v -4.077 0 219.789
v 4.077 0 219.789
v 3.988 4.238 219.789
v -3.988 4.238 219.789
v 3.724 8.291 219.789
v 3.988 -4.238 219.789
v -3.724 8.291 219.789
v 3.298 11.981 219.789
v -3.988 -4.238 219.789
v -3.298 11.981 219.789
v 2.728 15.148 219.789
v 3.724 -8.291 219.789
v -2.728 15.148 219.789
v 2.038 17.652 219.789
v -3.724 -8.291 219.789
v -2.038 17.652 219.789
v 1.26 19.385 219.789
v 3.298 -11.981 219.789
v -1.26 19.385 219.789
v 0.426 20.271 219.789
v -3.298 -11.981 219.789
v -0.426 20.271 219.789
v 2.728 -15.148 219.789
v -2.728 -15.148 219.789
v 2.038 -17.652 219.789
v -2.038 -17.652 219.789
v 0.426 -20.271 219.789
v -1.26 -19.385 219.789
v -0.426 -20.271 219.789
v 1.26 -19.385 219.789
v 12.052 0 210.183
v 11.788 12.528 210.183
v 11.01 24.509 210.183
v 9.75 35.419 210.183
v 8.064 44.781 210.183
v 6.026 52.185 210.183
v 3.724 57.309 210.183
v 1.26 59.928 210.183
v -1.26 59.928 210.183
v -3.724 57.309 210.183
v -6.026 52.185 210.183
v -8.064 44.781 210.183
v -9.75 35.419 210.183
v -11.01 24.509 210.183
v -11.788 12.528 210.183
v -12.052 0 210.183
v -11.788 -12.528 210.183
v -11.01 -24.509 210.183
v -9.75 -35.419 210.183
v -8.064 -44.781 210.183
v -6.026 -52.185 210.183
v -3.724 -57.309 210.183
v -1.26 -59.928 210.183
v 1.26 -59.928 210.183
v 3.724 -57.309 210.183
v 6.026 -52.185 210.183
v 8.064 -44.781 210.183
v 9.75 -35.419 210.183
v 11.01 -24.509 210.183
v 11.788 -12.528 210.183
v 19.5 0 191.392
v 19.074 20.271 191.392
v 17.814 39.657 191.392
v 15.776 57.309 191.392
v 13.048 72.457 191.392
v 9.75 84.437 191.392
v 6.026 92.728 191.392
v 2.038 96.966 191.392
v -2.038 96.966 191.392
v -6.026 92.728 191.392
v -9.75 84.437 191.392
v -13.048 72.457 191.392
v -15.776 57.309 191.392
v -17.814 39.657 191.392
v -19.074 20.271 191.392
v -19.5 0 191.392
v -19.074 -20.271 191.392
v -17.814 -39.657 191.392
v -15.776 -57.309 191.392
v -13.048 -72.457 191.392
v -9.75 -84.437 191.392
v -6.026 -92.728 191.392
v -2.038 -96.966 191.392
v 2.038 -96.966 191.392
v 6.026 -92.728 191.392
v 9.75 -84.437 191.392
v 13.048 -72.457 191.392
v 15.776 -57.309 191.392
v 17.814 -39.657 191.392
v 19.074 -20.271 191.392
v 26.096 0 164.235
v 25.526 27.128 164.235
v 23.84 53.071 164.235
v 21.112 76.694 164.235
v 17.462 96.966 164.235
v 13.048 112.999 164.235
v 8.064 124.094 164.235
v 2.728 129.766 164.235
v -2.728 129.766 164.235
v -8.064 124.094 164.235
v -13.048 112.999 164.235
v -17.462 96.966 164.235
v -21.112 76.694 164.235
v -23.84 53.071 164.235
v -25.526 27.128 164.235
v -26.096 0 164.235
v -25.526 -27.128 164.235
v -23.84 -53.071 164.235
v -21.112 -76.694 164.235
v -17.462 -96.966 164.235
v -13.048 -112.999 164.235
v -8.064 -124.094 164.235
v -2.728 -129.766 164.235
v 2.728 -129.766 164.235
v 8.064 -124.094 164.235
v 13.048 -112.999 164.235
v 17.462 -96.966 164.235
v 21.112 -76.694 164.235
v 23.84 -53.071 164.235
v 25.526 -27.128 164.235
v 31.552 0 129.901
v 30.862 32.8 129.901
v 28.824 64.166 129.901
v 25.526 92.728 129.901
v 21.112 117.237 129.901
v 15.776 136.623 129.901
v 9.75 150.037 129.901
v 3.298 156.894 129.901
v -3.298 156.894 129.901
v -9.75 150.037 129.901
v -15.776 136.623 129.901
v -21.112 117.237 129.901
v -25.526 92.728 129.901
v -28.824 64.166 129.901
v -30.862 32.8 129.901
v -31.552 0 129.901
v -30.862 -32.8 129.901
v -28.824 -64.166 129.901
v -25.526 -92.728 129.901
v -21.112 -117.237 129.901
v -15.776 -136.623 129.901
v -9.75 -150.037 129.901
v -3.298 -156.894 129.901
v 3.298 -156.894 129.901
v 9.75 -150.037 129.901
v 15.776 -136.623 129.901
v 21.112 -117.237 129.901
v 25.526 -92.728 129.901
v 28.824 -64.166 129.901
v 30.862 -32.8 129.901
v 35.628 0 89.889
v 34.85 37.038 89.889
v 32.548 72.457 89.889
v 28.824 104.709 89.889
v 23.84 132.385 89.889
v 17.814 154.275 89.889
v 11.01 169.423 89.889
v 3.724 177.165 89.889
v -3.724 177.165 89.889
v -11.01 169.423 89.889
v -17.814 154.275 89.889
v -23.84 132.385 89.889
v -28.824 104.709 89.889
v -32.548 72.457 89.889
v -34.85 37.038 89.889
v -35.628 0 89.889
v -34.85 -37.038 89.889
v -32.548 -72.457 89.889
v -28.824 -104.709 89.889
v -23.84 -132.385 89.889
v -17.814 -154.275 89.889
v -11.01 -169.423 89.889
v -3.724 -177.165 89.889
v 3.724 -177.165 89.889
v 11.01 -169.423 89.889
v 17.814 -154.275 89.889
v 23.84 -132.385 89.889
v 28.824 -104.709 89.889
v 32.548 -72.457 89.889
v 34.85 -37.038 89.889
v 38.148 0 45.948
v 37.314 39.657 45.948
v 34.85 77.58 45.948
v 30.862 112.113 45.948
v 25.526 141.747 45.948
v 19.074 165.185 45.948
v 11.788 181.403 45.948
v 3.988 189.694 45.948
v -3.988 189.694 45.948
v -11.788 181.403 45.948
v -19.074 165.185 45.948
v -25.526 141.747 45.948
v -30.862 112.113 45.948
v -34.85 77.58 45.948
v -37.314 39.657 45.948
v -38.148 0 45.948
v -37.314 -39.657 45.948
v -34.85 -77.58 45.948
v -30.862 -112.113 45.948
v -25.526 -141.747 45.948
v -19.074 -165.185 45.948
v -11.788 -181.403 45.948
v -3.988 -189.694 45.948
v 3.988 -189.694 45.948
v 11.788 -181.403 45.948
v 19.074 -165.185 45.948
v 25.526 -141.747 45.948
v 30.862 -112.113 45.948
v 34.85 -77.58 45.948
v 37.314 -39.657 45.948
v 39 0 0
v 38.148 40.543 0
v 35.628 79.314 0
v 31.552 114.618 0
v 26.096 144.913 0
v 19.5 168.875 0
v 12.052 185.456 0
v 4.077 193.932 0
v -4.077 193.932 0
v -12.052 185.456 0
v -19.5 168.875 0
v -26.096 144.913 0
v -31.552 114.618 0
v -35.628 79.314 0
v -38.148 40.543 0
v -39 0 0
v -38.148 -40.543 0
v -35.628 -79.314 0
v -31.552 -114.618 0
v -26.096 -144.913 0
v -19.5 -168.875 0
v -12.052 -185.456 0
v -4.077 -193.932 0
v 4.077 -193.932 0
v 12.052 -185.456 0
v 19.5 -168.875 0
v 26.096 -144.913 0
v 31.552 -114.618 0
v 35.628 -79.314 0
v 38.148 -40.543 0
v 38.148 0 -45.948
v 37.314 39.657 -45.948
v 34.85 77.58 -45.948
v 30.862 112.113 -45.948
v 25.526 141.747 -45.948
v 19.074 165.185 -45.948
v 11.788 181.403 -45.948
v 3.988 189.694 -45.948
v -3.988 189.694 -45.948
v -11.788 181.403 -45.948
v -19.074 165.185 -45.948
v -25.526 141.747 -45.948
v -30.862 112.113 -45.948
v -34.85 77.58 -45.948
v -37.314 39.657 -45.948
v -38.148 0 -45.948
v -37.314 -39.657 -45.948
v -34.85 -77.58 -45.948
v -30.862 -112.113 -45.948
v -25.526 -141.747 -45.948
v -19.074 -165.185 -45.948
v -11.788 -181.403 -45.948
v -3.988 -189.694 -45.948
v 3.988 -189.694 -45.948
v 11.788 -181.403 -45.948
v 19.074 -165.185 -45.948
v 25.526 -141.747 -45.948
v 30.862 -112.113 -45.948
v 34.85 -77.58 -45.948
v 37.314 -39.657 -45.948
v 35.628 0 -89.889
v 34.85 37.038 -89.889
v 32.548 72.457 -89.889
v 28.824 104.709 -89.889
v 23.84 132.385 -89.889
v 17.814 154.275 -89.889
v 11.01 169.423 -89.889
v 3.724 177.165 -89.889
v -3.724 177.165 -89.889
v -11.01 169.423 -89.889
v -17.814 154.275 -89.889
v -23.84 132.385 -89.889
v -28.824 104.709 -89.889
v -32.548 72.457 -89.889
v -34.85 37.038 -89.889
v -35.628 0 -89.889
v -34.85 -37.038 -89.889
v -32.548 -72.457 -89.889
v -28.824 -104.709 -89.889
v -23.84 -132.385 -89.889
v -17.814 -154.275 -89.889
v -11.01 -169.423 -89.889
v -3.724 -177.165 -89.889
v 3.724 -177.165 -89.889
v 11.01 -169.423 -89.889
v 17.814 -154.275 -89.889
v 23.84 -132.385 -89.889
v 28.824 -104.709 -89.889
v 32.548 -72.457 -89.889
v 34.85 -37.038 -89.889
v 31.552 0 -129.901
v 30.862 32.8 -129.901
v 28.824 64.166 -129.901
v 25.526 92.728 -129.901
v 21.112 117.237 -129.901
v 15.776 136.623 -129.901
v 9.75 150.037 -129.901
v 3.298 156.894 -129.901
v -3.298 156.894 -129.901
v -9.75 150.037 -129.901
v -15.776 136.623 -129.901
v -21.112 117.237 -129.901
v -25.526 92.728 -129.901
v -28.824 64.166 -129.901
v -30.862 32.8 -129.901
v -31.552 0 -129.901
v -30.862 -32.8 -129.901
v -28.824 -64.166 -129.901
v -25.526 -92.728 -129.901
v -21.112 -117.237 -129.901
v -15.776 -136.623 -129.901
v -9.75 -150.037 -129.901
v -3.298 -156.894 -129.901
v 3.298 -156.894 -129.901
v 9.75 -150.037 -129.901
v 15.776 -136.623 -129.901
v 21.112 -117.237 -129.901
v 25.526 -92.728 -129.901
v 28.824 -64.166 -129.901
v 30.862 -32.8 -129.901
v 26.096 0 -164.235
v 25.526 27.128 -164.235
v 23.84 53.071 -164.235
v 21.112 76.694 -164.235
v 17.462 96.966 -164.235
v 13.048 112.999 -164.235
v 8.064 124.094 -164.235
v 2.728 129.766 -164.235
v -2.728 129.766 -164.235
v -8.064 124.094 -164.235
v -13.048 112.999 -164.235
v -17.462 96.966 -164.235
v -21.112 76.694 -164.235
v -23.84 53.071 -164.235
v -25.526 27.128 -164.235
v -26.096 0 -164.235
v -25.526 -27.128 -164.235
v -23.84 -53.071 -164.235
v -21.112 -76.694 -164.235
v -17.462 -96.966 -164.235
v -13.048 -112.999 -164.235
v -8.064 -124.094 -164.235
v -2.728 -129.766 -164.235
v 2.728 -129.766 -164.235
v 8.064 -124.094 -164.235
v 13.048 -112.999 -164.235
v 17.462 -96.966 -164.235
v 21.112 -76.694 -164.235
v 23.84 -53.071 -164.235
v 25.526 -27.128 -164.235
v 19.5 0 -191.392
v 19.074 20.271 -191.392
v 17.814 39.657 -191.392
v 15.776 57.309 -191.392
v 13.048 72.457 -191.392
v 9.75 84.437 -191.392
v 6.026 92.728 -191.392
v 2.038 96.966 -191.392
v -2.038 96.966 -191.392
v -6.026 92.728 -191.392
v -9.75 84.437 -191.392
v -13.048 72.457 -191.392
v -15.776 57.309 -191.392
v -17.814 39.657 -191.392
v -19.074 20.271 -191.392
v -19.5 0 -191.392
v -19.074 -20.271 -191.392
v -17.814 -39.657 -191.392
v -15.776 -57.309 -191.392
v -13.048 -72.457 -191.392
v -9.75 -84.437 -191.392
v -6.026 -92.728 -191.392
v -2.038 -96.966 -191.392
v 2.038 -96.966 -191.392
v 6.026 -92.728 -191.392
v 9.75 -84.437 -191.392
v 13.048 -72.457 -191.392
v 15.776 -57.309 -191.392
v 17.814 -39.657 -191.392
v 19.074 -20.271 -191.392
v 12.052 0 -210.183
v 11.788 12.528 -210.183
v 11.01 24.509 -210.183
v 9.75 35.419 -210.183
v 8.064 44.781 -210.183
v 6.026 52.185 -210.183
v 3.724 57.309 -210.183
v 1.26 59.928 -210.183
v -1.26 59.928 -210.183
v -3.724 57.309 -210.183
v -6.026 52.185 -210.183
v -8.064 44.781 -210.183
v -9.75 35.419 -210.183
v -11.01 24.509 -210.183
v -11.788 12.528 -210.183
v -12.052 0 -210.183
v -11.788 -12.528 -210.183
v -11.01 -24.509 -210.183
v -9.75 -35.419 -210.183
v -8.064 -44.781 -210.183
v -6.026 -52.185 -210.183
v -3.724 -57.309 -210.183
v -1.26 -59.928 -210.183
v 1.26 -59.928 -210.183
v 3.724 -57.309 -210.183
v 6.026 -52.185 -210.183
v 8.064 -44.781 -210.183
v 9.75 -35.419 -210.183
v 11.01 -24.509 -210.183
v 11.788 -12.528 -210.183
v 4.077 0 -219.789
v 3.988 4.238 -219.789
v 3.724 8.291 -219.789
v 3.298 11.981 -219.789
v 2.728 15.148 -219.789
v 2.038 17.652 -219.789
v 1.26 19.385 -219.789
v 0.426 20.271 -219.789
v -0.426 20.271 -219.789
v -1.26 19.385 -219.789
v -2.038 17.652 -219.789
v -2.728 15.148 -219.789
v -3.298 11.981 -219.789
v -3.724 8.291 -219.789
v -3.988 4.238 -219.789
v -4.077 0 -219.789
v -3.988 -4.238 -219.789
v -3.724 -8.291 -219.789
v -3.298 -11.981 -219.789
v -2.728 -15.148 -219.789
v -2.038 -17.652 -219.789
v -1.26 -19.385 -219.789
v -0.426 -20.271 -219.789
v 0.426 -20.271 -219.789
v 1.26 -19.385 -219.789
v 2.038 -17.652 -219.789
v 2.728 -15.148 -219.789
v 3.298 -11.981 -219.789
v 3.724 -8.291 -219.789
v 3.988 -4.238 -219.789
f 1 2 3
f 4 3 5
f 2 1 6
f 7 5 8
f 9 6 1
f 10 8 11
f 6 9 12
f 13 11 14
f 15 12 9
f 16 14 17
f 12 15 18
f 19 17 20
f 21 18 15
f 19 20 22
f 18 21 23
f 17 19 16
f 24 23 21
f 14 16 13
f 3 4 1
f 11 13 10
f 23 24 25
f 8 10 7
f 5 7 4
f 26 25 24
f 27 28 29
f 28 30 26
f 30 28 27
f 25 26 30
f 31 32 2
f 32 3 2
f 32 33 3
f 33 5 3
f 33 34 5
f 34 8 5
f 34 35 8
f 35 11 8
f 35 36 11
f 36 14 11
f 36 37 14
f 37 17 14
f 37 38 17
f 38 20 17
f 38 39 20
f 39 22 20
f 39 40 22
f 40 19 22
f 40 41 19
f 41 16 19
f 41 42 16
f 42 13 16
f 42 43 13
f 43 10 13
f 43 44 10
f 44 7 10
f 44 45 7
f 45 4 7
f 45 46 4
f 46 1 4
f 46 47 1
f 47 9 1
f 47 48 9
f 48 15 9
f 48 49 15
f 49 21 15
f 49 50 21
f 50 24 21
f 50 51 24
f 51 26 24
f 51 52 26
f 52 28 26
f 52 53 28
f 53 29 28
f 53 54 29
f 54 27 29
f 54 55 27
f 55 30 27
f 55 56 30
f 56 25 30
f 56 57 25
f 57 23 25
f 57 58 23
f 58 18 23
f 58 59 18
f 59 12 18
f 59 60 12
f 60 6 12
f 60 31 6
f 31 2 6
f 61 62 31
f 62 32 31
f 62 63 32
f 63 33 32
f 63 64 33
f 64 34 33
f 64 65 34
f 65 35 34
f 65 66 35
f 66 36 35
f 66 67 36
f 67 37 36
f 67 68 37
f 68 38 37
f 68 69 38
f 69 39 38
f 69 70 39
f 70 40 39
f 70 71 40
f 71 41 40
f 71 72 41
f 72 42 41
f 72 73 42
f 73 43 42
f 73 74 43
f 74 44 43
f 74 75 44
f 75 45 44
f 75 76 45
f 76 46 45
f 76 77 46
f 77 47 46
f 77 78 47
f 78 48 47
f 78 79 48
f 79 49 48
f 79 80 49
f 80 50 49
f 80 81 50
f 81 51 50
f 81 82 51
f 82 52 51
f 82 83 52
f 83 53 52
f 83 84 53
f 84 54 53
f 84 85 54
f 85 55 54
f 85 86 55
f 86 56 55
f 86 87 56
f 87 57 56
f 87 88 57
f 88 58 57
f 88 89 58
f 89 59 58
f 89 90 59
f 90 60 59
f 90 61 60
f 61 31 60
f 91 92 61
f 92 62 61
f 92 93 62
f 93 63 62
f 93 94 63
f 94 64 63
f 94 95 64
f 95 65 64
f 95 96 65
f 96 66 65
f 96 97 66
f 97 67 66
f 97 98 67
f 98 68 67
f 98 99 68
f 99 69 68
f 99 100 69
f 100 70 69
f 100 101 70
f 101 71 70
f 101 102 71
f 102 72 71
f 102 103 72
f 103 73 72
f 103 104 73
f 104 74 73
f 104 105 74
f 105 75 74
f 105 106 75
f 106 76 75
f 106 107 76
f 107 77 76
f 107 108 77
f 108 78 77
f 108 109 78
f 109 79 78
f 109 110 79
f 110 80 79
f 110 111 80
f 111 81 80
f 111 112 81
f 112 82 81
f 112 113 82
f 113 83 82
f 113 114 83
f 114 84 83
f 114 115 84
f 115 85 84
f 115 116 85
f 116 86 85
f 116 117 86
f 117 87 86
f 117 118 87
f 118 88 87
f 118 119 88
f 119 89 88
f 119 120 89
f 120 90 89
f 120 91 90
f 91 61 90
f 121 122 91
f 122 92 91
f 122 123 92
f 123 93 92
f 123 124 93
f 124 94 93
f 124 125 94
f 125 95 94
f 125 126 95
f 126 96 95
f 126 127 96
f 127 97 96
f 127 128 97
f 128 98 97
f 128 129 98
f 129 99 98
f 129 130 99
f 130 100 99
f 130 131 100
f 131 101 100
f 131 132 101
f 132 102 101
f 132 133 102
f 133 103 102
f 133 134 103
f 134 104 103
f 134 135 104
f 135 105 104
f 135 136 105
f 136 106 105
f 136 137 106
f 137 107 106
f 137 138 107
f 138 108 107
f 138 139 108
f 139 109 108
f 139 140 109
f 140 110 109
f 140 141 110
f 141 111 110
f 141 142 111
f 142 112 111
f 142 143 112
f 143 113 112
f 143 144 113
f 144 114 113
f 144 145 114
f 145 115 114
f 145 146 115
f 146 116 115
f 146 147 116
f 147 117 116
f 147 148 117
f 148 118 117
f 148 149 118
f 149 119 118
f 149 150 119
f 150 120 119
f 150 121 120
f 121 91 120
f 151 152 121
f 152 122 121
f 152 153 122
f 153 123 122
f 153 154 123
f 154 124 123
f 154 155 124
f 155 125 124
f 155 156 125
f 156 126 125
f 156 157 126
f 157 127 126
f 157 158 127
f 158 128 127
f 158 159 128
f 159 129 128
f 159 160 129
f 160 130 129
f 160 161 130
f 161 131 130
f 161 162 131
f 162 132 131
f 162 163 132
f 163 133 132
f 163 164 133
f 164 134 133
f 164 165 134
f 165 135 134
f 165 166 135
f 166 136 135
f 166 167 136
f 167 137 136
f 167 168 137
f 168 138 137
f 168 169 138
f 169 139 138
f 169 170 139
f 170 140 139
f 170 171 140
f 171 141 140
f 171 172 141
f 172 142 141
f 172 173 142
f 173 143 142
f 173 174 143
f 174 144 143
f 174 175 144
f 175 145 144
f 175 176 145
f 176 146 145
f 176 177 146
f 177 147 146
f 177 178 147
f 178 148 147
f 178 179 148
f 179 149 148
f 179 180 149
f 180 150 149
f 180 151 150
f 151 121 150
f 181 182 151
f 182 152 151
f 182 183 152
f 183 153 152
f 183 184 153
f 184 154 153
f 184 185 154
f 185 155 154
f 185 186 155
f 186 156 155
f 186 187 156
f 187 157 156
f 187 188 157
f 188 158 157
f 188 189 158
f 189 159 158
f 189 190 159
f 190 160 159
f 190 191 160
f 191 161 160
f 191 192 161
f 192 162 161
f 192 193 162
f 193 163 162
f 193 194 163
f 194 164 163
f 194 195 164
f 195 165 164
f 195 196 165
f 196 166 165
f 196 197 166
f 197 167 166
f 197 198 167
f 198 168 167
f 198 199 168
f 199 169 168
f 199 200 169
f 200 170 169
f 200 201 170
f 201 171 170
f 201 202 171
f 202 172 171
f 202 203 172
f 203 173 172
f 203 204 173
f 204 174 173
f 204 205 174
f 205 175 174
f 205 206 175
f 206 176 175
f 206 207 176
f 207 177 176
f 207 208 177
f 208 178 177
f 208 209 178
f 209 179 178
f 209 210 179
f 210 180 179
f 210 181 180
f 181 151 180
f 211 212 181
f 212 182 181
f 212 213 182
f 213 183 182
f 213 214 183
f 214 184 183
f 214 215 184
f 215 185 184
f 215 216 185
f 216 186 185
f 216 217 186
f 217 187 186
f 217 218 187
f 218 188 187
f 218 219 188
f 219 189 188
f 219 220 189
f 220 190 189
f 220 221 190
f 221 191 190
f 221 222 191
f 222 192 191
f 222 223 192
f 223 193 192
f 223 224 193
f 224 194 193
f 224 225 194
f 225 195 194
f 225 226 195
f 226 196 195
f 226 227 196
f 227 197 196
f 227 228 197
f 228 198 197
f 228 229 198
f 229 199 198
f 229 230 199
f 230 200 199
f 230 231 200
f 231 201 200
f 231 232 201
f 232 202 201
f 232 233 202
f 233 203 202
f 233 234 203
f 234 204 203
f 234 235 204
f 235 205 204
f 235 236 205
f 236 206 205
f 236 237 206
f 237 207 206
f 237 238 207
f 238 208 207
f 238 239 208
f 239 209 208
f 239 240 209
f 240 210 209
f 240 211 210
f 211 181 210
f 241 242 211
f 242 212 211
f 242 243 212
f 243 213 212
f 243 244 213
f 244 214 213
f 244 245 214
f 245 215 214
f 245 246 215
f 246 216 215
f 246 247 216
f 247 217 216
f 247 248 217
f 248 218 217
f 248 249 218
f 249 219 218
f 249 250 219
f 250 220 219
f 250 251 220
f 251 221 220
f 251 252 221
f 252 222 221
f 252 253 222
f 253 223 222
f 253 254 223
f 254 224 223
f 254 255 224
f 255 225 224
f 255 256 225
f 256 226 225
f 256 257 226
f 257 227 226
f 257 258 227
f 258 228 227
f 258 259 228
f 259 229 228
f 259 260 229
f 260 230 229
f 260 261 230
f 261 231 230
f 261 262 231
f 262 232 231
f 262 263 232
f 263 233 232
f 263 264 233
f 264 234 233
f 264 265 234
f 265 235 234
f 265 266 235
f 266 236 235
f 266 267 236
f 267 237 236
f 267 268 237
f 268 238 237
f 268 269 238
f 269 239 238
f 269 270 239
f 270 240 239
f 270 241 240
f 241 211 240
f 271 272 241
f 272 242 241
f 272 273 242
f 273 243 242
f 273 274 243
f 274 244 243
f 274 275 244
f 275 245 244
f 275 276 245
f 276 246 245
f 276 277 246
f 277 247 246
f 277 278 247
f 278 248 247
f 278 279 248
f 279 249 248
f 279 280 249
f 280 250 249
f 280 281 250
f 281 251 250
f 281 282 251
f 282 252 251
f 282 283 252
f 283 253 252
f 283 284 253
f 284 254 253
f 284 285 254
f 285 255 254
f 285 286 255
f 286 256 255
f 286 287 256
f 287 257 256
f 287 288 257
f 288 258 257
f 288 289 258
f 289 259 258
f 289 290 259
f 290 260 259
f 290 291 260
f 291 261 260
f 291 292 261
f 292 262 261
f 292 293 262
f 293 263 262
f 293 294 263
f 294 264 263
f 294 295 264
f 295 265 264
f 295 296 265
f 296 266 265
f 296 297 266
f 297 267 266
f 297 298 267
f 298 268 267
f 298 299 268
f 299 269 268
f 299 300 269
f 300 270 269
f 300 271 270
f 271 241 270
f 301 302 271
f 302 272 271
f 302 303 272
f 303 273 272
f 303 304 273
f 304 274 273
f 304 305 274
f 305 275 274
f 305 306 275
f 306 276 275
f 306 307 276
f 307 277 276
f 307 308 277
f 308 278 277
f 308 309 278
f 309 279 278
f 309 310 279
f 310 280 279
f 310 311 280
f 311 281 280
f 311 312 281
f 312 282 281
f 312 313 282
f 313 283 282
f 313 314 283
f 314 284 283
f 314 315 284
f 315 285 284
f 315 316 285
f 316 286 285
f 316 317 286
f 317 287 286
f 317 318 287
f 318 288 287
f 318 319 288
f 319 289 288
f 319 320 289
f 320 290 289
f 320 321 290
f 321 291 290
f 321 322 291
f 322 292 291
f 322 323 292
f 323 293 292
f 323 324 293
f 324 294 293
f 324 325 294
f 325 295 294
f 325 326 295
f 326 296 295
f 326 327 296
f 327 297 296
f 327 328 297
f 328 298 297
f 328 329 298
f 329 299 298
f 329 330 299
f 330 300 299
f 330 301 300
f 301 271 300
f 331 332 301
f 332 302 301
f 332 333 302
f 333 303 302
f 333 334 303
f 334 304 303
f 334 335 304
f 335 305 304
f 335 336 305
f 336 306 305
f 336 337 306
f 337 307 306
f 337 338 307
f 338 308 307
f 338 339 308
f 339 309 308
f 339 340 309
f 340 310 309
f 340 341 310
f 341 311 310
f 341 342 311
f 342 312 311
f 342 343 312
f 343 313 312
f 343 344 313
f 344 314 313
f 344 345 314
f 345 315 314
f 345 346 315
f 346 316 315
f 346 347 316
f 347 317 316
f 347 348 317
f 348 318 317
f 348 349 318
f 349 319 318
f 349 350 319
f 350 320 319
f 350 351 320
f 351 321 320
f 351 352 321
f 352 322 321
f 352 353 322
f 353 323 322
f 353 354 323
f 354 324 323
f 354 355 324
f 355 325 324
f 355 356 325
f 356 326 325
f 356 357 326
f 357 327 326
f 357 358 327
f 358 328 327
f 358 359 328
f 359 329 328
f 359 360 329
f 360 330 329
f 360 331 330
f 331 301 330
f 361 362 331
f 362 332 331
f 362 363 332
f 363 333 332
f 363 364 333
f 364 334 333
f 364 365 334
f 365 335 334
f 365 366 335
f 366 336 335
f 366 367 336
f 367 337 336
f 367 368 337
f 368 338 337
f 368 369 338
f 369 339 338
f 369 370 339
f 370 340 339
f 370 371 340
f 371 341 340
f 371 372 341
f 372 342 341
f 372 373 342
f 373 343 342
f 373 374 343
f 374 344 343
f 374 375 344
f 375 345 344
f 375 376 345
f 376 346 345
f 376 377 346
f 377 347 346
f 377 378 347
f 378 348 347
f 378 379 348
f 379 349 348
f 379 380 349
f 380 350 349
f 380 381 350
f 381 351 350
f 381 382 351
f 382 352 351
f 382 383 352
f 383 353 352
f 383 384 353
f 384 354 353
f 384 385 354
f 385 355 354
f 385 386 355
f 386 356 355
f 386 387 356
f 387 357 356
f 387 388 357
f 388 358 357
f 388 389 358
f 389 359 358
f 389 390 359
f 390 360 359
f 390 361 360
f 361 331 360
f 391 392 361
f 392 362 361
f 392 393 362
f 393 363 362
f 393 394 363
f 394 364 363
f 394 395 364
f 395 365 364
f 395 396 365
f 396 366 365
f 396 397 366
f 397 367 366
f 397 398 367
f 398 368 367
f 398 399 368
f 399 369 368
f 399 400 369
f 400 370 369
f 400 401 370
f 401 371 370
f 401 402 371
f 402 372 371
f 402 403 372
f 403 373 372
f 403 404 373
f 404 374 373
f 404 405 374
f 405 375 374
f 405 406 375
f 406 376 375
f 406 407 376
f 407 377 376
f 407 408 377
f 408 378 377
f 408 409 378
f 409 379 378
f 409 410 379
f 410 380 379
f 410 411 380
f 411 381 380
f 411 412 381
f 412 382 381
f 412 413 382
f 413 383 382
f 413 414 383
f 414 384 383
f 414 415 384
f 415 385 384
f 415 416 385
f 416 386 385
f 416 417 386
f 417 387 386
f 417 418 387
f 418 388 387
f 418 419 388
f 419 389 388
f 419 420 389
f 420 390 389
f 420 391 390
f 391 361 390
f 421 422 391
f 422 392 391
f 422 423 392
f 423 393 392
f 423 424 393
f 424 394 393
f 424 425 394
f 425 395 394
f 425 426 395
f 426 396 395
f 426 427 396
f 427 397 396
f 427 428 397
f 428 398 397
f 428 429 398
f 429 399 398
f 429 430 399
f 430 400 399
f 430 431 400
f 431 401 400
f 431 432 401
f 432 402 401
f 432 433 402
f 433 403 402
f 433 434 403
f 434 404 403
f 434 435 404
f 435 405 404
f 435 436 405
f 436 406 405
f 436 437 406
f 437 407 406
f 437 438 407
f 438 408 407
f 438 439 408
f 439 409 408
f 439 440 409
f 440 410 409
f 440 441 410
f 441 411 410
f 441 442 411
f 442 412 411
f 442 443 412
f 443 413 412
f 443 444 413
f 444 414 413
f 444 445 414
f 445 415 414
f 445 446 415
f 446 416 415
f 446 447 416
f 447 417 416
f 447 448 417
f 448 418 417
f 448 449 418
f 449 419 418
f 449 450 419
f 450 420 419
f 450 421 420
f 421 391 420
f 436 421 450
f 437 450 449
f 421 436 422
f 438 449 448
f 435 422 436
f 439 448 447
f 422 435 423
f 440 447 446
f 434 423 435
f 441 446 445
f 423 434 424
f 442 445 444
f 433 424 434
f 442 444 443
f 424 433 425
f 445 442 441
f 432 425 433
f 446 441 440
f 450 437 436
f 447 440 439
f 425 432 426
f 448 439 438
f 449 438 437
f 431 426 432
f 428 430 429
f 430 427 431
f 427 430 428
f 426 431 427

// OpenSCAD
// Generated by SolidPython 1.0.1 on 2020-07-29 00:46:45


scale(v = [3, 15, 17]) {
	sphere(r = 13);
}
/***********************************************
*********      SolidPython code:      **********
************************************************
 
# import packages: SolidPython
from solid import *
from solid.utils import *
from itertools import chain, combinations, permutations


class Resize:

    def __init__(self, scad_file):
        self.scad_file = scad_file
        #self.scad_file = import_scad(scad_file)
        # cone/cylinder param:
        self.r1 = 0
        self.r2 = 0
        self.h = 0
        # rectangular prism param:
        self.w = 0
        self.l = 0
        # ellipse param:
        self.r = 0

    # import OpenScad code (file name corresponds to shape)


    # classify shape + parameters
    def assign(self, param1, param2, param3):
        if self.scad_file == 'cone.scad':
            self.r1 = param1
            self.r2 = param2
            self.h = param3
        elif self.scad_file == 'cylinder.scad':
            self.r1 = param1
            self.r2 = param2
            self.h = param3
        elif self.scad_file == 'rectangularPrism.scad':
            self.h = param1
            self.l = param2
            self.w = param3
        else:
            self.r = param1
            self.h = param2

    # resize parameters
    def iterate(self):
        x = range(3, 20, 2)
        i = 1
        if self.scad_file == 'cone.scad':
            tempList = list(permutations(x, 2))
            for temp in tempList:
                param1 = temp[0]
                param2 = temp[1]
                filepath = 'produced_scad_files/' + 'cone' + str(param1) + '_' + str(param2) + '_' + '.scad'
                scad_render_to_file(cylinder(h=param1, r1=param2, r2=0), filepath)

        elif self.scad_file == 'cylinder.scad':
            tempList = list(permutations(x, 3))
            for temp in tempList:
                param1 = temp[0]
                param2 = temp[1]
                filepath = 'produced_scad_files/' + 'cylinder' + str(param1) + '_' + str(param2) + '_' + '.scad'
                scad_render_to_file(cylinder(h=param1, r1=param2, r2=param2), filepath)

        elif self.scad_file == 'rectangularPrism.scad':
            tempList = list(permutations(x, 3))
            for temp in tempList:
                param1 = temp[0]
                param2 = temp[1]
                param3 = temp[2]
                filepath = 'produced_scad_files/' + 'rectangularPrism' + str(param1) + '_' + str(param2) + '_' + str(
                    param3) + '.scad'
                scad_render_to_file(cube(size=(param1, param2, param3)), filepath)

        elif self.scad_file == 'ellipse.scad':
            tempList = list(permutations(x, 4))
            for temp in tempList:
                param1 = temp[0]
                param2 = temp[1]
                param3 = temp[2]
                param4 = temp[3]
                filepath = 'produced_scad_files/' + 'ellipse' + str(param1) + '_' + str(param2) + '_' + str(param3) + '_' + str(param4) + '.scad'
                scad_render_to_file(scale([param1, param2, param3])(sphere(r=param4)), filepath)

    def render_to_scadfile(self):
        scad_render_to_file(scad, 'example.scad') 
 
************************************************/
